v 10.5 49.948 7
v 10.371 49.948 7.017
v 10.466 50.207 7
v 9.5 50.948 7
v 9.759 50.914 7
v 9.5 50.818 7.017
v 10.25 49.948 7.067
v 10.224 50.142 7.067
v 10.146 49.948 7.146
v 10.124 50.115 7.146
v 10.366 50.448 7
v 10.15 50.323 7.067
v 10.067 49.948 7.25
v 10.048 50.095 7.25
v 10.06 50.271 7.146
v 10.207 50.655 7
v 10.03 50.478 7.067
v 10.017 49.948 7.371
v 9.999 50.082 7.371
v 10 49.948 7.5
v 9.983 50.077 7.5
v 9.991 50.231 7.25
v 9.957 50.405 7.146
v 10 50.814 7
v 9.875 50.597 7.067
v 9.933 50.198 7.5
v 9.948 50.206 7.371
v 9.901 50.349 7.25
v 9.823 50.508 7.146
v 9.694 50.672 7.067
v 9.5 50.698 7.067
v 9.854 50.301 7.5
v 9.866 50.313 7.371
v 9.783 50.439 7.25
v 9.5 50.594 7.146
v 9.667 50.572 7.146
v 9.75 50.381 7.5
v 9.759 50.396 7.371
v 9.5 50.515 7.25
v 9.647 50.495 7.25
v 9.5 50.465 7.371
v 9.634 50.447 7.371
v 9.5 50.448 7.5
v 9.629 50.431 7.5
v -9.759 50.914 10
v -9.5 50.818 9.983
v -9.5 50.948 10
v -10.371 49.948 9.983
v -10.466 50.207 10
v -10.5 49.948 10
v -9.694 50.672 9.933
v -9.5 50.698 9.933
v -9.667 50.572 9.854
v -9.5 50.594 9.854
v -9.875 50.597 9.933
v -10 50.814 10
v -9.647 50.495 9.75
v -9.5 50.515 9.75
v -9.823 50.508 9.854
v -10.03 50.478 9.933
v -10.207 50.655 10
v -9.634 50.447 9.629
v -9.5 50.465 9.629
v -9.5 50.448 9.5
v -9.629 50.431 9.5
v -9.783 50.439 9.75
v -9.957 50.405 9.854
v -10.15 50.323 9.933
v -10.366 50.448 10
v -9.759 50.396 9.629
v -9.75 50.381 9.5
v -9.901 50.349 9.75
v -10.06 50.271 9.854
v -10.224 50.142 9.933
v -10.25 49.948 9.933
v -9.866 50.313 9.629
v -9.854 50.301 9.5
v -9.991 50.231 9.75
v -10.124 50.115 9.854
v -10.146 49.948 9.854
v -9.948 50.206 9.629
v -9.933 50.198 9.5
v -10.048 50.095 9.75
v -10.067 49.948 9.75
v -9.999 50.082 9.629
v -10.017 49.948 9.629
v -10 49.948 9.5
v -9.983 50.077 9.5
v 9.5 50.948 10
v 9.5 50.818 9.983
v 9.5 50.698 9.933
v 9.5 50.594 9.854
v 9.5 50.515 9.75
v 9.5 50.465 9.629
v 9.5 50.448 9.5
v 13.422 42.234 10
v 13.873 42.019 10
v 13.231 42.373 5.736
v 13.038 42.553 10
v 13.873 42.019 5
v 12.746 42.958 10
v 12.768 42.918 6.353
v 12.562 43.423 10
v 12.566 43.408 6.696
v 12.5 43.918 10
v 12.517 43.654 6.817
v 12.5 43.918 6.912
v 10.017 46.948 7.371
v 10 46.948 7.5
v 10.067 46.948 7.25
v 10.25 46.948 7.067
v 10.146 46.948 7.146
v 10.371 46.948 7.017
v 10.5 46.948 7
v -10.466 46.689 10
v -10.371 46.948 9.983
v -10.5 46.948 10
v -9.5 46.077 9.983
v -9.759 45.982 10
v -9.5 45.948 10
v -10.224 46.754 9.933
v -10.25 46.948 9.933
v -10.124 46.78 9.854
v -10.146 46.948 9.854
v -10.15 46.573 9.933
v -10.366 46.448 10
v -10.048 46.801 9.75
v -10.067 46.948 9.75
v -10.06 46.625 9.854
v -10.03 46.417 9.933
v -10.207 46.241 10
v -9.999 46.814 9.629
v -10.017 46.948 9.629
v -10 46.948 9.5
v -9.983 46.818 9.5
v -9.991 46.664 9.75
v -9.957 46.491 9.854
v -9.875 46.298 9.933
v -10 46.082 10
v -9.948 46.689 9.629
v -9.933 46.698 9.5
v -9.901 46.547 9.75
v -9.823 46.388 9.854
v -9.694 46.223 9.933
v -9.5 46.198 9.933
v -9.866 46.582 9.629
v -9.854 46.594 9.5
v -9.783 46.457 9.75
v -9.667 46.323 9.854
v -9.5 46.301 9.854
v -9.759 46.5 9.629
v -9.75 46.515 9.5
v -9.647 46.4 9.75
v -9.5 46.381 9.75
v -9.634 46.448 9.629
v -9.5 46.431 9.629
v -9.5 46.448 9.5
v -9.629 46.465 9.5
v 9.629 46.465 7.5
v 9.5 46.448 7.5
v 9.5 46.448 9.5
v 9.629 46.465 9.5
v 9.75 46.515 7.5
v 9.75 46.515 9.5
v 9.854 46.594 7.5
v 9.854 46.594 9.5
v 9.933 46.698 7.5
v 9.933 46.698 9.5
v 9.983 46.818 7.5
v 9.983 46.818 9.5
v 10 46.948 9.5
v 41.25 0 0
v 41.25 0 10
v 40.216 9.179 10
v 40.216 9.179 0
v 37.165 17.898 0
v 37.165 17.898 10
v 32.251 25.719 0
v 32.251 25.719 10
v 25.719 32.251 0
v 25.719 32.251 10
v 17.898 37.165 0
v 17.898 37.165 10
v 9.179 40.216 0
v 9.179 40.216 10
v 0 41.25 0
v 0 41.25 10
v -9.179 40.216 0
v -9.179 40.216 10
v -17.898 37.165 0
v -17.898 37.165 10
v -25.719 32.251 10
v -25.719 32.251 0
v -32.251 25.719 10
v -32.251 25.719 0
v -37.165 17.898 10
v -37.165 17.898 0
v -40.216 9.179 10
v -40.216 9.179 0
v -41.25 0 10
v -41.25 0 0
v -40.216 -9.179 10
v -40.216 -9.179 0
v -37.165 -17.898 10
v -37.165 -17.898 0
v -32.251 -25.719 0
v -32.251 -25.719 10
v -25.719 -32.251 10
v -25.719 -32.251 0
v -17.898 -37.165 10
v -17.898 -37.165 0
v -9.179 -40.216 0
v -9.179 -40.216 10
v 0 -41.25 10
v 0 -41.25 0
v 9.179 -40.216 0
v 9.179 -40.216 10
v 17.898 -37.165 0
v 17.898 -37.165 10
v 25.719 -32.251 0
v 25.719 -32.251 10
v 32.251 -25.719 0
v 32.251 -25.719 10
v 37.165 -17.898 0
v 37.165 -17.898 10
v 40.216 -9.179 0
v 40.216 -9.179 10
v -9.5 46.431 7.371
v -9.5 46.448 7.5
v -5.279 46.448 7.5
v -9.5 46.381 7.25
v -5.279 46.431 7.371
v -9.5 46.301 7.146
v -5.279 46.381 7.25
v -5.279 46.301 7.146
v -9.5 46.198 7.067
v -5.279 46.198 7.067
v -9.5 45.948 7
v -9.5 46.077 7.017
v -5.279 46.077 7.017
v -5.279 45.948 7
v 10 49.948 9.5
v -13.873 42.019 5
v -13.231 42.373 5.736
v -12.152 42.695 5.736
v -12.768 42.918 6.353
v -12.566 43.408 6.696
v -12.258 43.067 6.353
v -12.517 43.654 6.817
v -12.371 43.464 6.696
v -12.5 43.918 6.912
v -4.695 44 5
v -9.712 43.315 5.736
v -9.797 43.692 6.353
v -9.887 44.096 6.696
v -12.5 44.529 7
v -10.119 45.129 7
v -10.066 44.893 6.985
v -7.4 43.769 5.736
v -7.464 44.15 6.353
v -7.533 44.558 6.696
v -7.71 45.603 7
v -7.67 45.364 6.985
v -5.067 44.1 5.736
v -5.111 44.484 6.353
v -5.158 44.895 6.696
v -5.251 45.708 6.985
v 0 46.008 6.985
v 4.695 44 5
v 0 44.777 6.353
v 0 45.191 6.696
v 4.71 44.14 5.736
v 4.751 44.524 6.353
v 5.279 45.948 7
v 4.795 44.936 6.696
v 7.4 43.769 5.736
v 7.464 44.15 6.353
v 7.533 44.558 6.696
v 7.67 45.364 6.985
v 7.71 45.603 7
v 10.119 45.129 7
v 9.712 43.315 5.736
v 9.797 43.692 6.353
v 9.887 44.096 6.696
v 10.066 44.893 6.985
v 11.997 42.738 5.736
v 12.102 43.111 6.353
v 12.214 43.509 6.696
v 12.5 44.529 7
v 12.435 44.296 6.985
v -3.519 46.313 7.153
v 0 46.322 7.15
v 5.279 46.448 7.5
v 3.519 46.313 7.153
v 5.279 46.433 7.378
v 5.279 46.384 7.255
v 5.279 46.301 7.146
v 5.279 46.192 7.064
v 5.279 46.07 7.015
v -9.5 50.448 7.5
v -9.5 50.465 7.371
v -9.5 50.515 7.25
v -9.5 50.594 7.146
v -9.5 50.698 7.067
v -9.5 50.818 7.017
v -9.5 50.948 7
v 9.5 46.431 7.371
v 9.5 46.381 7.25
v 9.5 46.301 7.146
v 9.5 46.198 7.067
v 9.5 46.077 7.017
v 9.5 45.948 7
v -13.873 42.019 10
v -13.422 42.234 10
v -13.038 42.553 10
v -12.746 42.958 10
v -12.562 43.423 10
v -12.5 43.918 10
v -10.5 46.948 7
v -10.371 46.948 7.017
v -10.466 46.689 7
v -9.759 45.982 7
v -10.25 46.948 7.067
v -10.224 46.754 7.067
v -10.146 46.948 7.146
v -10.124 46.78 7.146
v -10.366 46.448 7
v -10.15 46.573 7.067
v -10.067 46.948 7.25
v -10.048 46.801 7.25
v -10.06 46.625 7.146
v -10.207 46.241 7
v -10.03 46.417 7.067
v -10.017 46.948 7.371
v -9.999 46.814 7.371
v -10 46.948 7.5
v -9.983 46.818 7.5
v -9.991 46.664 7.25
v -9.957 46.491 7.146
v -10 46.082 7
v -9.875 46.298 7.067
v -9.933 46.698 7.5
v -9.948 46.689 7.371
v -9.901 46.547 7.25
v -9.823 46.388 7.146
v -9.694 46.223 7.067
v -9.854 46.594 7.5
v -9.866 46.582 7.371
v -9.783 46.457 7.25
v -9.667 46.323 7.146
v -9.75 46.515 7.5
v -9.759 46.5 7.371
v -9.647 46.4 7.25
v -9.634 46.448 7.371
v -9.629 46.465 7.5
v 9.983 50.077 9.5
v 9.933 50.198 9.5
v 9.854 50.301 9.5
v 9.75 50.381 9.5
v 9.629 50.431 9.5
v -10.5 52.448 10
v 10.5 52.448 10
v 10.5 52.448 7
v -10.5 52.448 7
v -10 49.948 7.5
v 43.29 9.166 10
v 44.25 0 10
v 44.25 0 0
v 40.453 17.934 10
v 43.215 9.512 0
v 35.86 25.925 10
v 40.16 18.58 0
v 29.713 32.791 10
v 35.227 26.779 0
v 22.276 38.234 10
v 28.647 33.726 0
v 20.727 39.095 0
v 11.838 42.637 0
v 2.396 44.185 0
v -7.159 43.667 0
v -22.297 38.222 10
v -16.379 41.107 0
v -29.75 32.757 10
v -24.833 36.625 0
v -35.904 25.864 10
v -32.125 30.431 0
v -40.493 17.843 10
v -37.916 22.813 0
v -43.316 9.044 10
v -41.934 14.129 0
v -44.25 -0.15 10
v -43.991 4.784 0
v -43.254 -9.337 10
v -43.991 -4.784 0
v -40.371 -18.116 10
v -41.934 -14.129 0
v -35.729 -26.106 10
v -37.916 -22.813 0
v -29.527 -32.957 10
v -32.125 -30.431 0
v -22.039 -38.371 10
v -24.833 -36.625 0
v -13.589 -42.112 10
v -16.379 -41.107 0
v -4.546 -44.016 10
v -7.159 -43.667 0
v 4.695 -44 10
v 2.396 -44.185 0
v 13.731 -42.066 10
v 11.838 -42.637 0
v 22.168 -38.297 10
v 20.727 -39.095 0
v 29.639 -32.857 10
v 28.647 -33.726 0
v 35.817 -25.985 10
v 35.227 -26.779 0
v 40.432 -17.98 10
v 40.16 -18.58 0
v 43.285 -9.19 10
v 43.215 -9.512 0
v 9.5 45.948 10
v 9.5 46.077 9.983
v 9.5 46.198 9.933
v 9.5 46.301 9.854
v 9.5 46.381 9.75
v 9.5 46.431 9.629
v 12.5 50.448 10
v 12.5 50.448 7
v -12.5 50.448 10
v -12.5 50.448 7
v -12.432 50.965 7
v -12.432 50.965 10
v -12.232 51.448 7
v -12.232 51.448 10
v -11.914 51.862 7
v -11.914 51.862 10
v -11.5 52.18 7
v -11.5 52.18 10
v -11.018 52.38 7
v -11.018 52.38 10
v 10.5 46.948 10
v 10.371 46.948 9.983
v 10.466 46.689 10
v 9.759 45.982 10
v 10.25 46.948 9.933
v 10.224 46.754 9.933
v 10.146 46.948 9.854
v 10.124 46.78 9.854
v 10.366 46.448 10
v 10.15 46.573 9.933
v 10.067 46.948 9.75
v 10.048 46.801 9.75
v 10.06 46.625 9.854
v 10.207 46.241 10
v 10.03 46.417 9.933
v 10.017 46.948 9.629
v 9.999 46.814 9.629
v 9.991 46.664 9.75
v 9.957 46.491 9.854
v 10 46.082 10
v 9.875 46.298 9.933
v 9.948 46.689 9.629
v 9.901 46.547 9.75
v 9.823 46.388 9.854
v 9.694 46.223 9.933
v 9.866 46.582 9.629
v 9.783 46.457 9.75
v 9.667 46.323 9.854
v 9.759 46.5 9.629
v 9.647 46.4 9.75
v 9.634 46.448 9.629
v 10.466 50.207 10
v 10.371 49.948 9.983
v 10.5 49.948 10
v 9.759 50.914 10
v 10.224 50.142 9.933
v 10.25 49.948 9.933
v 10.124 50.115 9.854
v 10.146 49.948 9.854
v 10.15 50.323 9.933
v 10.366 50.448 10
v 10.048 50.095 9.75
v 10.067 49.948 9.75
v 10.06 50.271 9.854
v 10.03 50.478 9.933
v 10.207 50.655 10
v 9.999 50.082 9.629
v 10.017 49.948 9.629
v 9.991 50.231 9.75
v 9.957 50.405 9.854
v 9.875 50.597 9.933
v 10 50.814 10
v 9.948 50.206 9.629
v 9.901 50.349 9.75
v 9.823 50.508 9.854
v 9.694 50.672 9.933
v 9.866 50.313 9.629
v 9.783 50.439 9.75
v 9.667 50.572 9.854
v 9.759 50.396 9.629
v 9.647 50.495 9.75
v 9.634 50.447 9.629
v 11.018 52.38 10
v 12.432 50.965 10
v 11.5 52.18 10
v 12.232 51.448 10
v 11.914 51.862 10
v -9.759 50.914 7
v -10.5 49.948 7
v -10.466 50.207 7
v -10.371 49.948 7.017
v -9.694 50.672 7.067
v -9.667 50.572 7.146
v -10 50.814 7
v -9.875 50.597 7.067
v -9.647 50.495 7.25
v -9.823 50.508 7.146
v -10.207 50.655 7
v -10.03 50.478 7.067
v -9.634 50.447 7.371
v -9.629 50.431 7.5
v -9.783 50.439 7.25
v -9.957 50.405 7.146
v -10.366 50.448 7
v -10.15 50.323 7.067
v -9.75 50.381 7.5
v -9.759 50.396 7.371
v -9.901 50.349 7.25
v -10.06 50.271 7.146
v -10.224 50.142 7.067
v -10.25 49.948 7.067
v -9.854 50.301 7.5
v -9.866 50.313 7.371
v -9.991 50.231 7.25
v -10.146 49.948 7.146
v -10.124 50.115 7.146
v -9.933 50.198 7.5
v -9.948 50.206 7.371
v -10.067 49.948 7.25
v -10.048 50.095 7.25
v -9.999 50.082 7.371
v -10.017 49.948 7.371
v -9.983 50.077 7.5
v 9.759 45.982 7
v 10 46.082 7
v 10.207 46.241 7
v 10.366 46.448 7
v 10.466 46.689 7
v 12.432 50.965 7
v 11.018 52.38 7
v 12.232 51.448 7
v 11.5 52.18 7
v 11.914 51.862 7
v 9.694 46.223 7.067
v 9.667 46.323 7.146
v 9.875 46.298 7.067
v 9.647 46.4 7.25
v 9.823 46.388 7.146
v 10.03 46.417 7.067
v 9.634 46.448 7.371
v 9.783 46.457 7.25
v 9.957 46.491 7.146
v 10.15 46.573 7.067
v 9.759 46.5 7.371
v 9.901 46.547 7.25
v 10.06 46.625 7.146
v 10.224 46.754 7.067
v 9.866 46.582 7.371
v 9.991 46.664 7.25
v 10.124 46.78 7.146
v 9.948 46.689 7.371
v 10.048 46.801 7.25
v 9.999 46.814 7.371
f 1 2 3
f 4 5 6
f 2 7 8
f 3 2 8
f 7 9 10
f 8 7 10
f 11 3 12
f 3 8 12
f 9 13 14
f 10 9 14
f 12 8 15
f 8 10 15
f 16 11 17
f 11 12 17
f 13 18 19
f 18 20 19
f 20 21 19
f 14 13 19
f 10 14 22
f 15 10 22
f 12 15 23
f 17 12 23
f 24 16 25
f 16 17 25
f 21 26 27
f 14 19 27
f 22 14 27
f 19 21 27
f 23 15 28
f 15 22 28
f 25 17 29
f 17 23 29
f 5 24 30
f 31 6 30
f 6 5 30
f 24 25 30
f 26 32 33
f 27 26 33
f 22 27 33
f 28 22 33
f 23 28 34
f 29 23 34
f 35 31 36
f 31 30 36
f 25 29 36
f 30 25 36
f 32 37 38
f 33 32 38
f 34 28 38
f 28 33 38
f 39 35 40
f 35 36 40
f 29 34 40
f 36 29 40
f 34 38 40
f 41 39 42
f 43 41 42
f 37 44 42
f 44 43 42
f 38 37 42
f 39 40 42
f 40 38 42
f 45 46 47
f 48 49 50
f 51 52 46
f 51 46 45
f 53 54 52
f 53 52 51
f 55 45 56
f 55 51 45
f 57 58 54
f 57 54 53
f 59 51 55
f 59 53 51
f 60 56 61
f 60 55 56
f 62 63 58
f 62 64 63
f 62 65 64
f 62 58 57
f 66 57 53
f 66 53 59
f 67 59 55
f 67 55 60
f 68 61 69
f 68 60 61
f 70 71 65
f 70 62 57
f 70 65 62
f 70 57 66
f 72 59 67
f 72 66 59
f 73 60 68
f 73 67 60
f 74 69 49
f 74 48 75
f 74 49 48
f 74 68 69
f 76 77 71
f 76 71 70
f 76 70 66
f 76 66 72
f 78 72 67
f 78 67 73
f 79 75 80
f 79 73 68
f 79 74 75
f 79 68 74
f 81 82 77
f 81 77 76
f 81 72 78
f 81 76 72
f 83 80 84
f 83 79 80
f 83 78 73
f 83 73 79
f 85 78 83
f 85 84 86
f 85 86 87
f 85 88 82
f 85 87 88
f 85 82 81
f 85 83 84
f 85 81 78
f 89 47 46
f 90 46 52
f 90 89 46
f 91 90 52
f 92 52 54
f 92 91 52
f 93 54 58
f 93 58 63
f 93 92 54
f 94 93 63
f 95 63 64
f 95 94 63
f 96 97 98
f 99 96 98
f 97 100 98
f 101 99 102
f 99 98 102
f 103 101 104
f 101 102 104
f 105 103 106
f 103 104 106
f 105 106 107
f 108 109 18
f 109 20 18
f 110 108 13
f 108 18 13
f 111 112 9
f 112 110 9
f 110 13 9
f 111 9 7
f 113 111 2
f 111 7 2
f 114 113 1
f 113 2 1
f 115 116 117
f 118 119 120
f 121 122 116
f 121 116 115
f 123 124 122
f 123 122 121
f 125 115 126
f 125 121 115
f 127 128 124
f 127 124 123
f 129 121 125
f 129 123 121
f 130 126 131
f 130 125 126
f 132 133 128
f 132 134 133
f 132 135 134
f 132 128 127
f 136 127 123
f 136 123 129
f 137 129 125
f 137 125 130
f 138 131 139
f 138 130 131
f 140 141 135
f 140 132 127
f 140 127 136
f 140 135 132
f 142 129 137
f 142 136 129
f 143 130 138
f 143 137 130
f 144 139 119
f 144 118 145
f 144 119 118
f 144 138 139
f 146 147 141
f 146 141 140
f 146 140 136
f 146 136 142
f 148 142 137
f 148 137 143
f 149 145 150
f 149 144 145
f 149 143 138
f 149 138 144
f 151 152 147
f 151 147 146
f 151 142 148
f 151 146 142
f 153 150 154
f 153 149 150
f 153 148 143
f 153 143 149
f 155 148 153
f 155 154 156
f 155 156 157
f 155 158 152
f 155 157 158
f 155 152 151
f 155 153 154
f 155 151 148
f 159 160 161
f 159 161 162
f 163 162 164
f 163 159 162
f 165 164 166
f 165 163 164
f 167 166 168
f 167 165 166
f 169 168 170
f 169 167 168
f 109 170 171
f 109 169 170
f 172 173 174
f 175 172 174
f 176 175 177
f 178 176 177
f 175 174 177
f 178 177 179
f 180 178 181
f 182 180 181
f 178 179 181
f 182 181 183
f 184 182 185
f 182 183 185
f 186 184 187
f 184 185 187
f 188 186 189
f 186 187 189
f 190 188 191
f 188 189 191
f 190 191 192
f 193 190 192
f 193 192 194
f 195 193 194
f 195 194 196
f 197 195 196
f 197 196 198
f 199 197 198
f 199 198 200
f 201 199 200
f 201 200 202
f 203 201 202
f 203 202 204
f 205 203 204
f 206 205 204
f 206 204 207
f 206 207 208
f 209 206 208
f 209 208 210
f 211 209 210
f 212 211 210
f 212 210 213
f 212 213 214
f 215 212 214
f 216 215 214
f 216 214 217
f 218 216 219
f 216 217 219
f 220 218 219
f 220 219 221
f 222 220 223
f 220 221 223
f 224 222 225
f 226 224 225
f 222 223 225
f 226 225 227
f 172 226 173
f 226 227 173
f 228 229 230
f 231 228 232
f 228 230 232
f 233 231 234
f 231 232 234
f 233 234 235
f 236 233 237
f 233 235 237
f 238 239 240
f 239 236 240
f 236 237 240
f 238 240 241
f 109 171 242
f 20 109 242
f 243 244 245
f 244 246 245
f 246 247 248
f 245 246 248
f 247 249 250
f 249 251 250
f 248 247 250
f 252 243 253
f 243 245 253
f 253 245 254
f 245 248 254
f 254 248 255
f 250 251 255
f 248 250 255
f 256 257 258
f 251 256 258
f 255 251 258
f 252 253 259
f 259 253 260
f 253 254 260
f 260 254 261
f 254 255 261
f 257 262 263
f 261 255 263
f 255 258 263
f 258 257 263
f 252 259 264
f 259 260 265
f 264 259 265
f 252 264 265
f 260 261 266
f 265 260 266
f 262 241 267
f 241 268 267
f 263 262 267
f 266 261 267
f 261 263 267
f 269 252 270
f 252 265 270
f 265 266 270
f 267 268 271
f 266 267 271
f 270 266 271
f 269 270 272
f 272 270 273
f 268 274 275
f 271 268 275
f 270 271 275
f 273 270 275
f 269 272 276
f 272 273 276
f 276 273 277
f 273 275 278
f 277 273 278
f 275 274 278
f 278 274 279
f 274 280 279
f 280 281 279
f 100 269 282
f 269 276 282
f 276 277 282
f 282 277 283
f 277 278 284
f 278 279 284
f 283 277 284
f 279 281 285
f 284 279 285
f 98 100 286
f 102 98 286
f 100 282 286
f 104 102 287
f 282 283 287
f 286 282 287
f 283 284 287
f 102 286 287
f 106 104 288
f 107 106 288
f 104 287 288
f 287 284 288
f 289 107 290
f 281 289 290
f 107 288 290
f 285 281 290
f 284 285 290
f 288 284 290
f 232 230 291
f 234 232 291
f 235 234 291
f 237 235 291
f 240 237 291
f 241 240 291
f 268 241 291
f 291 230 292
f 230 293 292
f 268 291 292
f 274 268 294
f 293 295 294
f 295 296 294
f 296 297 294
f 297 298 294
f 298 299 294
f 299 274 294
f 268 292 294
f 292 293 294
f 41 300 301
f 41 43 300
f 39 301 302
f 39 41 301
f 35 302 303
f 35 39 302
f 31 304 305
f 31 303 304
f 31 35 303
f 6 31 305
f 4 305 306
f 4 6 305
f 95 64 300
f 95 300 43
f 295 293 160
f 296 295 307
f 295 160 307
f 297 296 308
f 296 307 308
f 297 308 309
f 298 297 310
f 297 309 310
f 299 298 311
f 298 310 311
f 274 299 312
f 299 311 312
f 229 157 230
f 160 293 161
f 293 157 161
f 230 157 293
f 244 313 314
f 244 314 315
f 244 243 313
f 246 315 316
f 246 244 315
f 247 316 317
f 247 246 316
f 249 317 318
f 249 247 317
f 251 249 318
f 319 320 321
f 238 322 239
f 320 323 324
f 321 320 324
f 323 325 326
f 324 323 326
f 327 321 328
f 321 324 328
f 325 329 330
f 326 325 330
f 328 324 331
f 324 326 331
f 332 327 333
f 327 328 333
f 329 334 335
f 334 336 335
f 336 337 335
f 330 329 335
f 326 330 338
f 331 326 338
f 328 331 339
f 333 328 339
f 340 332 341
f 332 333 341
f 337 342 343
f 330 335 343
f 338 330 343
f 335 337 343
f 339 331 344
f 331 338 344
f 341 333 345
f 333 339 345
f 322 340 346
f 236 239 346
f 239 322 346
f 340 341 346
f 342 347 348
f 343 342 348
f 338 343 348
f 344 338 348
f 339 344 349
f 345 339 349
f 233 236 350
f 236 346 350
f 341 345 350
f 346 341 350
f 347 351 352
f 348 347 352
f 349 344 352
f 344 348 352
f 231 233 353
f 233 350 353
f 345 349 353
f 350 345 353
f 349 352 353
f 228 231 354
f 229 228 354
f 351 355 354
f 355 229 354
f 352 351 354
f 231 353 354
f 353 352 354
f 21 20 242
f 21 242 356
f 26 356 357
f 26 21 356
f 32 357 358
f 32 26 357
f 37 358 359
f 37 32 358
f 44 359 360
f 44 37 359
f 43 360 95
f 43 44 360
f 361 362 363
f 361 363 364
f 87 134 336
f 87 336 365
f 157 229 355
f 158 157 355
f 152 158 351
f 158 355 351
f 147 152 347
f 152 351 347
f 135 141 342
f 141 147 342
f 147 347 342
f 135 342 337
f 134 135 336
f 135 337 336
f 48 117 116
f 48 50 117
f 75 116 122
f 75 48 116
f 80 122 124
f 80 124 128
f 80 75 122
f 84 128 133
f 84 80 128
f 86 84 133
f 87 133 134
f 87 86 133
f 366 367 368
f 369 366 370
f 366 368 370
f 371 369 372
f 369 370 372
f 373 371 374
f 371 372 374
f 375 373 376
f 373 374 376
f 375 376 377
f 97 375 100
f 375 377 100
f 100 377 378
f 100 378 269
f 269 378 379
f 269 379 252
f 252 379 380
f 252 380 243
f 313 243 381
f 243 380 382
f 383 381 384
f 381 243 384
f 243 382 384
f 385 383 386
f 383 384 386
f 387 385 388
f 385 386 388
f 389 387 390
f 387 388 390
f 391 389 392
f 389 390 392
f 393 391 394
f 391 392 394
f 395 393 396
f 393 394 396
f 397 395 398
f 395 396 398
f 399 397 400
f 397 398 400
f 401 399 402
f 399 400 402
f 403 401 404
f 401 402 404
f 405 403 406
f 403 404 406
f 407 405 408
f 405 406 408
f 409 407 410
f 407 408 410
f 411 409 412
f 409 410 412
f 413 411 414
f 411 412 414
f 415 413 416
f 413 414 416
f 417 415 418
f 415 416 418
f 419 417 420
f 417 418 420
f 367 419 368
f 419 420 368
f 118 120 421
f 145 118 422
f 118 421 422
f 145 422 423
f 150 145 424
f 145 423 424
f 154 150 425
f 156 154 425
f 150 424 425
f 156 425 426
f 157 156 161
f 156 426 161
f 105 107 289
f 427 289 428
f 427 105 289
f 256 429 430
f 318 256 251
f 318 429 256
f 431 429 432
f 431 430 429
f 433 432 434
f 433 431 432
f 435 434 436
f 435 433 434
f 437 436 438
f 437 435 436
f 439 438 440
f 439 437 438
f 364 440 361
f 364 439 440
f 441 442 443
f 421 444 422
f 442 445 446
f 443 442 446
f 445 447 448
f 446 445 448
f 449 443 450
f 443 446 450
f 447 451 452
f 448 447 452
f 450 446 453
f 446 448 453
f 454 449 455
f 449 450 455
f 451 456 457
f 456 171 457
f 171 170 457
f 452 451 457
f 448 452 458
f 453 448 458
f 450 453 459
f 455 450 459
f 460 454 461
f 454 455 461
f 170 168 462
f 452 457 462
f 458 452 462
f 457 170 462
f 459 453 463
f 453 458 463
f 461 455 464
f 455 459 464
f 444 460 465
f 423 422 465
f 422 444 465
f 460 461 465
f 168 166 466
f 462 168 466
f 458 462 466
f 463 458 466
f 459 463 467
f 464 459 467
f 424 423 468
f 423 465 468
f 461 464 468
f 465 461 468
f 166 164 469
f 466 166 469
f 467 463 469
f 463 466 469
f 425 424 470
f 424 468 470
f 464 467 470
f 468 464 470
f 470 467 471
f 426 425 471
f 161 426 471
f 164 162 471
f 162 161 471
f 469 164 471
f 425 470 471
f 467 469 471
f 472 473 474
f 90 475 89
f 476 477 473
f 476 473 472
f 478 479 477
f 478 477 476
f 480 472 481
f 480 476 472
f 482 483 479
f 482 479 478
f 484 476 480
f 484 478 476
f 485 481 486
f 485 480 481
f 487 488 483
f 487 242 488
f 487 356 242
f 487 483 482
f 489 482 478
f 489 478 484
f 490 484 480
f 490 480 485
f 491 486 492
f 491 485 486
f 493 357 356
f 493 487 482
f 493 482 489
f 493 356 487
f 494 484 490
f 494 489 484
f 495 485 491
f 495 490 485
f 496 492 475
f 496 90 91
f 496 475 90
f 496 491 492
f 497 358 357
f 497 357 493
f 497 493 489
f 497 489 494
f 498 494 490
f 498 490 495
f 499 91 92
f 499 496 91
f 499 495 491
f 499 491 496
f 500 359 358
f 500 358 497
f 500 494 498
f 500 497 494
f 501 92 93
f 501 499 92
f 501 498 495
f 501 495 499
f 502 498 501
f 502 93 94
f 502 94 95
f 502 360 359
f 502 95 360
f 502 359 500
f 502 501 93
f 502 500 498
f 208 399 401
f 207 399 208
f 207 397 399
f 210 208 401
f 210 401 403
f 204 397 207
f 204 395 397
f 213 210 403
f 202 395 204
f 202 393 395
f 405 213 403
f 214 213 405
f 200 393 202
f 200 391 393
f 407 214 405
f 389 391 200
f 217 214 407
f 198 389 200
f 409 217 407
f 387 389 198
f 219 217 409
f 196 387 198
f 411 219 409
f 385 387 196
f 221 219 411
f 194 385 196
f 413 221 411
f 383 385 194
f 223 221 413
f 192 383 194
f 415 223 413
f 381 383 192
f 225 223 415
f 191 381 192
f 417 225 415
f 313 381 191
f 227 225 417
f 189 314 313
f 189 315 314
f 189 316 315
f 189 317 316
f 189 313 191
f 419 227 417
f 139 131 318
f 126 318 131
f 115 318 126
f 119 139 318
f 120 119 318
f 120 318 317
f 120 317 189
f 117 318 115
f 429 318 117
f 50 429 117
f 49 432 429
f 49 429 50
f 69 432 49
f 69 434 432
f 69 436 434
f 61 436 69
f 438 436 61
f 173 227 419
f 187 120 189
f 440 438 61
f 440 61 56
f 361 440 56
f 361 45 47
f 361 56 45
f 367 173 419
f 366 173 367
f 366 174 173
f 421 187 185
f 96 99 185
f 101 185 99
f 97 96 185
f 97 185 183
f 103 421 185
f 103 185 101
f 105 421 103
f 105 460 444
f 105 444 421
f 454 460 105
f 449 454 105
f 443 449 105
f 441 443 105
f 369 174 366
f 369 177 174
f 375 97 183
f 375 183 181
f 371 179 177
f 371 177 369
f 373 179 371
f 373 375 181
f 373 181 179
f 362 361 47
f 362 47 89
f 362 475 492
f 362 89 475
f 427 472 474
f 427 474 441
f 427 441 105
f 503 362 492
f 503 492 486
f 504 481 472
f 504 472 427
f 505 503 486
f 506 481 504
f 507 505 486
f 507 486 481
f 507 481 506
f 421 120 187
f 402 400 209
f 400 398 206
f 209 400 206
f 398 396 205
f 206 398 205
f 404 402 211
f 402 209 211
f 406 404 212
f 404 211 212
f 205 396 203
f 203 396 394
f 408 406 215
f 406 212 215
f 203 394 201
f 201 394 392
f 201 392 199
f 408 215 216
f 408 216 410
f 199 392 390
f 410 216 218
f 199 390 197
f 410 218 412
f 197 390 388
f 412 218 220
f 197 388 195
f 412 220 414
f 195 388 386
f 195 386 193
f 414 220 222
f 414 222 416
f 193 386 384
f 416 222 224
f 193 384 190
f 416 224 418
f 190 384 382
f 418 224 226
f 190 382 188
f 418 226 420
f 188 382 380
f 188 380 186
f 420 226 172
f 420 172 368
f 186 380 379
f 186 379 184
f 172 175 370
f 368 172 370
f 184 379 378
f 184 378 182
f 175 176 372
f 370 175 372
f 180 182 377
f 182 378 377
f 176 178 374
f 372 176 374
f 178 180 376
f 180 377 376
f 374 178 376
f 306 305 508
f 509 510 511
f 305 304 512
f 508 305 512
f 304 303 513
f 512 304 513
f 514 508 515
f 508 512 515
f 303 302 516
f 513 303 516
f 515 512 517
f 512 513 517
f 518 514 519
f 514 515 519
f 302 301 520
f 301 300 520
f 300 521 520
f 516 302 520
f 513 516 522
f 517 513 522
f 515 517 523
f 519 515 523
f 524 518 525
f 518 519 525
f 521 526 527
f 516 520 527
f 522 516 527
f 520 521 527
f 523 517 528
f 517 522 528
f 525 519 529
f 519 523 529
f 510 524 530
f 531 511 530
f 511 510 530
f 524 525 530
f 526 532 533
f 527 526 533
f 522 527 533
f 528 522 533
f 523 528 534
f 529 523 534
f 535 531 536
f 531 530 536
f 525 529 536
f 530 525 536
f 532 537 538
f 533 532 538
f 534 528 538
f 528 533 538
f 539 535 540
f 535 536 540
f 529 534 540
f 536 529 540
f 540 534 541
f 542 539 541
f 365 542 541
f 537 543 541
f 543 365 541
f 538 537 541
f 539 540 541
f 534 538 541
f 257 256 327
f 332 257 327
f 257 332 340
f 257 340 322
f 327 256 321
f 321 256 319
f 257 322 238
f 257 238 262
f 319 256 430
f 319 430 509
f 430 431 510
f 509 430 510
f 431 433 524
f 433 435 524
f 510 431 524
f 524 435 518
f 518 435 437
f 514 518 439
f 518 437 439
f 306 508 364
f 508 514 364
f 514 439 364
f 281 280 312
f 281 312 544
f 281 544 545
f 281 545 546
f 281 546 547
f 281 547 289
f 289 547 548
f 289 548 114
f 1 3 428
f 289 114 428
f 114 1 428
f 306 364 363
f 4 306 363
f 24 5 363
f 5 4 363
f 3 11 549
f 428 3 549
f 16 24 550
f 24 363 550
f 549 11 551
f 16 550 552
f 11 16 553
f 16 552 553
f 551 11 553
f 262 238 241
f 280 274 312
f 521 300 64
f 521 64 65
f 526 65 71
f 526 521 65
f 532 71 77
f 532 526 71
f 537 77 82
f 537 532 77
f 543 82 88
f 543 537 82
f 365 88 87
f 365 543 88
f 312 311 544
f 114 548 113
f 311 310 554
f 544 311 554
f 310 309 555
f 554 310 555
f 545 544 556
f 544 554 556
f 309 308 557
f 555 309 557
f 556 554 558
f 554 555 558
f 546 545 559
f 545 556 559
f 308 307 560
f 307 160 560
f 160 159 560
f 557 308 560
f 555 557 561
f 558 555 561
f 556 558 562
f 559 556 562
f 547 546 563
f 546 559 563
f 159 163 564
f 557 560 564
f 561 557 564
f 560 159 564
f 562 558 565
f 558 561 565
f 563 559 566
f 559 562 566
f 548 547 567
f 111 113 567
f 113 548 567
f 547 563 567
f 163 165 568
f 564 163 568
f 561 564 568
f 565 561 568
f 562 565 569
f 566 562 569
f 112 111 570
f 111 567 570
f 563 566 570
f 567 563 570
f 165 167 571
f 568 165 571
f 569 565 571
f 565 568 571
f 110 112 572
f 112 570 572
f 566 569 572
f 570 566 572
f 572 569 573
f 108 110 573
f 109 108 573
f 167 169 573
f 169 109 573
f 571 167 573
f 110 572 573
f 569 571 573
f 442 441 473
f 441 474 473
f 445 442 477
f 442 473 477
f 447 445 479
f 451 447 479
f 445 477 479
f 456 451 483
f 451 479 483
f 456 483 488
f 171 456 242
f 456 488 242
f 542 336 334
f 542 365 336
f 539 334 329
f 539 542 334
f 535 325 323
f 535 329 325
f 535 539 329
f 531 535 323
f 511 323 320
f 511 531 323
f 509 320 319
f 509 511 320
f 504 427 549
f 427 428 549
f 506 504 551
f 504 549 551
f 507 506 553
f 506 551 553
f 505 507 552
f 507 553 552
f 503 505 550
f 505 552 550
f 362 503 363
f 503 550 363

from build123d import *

# Parameters (mm, degrees)
F0_R     = 44.25
F1_DEPTH = 10
F2_R     = 41.25
F3_DEPTH = 15
F5_DEPTH = 3
F6_W     = 20
F6_H     = 4
F7_DEPTH = 25
F8_R     = 2
F9_R     = 0.5


with BuildPart() as f1:
    # F0 (on Top) → F1 (new body)
    with BuildSketch(Plane.XY):
        Circle(F0_R)
    extrude(amount=F1_DEPTH)

    # F2 (on face) → F3 (cut)
    with BuildSketch(Plane.XY.offset(10)):
        Circle(F2_R)
    extrude(amount=-F3_DEPTH, mode=Mode.SUBTRACT)

    # F4 (on face) → F5 (join)
    with BuildSketch(Plane.XY.offset(10)):
        with BuildLine():
            Line((12.5, 52.447762014), (-12.5, 52.447762014))
            Line((-12.5, 52.447762014), (-12.5, 42.447762014))
            ThreePointArc((-12.5, 42.447762014), (0, 44.25), (12.5, 42.447762014))
            Line((12.5, 42.447762014), (12.5, 52.447762014))
        make_face()
    extrude(amount=-F5_DEPTH)

    # F6 (on face) → F7 (cut)
    with BuildSketch(Plane.XY.offset(10)):
        with Locations((0, 48.447762014)):
            Rectangle(F6_W, F6_H)
    extrude(amount=-F7_DEPTH, mode=Mode.SUBTRACT)

    # F8
    f8_edges = [f1.edges().sort_by_distance(p)[0] for p in [
        (0, 44.25, 7),
        (12.5, 42.447762, 8.5),
        (12.5, 52.447762, 8.5),
        (-12.5, 42.447762, 8.5),
        (-12.5, 52.447762, 8.5),
    ]]
    fillet(f8_edges, radius=F8_R)

    # F9
    f9_edges = [f1.edges().sort_by_distance(p)[0] for p in [
        (0, 46.447762, 10),
        (10, 46.447762, 8.5),
        (0, 46.447762, 7),
        (-10, 46.447762, 8.5),
        (-10, 48.447762, 10),
        (-10, 48.447762, 7),
        (-10, 50.447762, 8.5),
        (0, 50.447762, 10),
        (0, 50.447762, 7),
        (10, 50.447762, 8.5),
        (10, 48.447762, 10),
        (10, 48.447762, 7),
    ]]
    fillet(f9_edges, radius=F9_R)


solid = f1.part
